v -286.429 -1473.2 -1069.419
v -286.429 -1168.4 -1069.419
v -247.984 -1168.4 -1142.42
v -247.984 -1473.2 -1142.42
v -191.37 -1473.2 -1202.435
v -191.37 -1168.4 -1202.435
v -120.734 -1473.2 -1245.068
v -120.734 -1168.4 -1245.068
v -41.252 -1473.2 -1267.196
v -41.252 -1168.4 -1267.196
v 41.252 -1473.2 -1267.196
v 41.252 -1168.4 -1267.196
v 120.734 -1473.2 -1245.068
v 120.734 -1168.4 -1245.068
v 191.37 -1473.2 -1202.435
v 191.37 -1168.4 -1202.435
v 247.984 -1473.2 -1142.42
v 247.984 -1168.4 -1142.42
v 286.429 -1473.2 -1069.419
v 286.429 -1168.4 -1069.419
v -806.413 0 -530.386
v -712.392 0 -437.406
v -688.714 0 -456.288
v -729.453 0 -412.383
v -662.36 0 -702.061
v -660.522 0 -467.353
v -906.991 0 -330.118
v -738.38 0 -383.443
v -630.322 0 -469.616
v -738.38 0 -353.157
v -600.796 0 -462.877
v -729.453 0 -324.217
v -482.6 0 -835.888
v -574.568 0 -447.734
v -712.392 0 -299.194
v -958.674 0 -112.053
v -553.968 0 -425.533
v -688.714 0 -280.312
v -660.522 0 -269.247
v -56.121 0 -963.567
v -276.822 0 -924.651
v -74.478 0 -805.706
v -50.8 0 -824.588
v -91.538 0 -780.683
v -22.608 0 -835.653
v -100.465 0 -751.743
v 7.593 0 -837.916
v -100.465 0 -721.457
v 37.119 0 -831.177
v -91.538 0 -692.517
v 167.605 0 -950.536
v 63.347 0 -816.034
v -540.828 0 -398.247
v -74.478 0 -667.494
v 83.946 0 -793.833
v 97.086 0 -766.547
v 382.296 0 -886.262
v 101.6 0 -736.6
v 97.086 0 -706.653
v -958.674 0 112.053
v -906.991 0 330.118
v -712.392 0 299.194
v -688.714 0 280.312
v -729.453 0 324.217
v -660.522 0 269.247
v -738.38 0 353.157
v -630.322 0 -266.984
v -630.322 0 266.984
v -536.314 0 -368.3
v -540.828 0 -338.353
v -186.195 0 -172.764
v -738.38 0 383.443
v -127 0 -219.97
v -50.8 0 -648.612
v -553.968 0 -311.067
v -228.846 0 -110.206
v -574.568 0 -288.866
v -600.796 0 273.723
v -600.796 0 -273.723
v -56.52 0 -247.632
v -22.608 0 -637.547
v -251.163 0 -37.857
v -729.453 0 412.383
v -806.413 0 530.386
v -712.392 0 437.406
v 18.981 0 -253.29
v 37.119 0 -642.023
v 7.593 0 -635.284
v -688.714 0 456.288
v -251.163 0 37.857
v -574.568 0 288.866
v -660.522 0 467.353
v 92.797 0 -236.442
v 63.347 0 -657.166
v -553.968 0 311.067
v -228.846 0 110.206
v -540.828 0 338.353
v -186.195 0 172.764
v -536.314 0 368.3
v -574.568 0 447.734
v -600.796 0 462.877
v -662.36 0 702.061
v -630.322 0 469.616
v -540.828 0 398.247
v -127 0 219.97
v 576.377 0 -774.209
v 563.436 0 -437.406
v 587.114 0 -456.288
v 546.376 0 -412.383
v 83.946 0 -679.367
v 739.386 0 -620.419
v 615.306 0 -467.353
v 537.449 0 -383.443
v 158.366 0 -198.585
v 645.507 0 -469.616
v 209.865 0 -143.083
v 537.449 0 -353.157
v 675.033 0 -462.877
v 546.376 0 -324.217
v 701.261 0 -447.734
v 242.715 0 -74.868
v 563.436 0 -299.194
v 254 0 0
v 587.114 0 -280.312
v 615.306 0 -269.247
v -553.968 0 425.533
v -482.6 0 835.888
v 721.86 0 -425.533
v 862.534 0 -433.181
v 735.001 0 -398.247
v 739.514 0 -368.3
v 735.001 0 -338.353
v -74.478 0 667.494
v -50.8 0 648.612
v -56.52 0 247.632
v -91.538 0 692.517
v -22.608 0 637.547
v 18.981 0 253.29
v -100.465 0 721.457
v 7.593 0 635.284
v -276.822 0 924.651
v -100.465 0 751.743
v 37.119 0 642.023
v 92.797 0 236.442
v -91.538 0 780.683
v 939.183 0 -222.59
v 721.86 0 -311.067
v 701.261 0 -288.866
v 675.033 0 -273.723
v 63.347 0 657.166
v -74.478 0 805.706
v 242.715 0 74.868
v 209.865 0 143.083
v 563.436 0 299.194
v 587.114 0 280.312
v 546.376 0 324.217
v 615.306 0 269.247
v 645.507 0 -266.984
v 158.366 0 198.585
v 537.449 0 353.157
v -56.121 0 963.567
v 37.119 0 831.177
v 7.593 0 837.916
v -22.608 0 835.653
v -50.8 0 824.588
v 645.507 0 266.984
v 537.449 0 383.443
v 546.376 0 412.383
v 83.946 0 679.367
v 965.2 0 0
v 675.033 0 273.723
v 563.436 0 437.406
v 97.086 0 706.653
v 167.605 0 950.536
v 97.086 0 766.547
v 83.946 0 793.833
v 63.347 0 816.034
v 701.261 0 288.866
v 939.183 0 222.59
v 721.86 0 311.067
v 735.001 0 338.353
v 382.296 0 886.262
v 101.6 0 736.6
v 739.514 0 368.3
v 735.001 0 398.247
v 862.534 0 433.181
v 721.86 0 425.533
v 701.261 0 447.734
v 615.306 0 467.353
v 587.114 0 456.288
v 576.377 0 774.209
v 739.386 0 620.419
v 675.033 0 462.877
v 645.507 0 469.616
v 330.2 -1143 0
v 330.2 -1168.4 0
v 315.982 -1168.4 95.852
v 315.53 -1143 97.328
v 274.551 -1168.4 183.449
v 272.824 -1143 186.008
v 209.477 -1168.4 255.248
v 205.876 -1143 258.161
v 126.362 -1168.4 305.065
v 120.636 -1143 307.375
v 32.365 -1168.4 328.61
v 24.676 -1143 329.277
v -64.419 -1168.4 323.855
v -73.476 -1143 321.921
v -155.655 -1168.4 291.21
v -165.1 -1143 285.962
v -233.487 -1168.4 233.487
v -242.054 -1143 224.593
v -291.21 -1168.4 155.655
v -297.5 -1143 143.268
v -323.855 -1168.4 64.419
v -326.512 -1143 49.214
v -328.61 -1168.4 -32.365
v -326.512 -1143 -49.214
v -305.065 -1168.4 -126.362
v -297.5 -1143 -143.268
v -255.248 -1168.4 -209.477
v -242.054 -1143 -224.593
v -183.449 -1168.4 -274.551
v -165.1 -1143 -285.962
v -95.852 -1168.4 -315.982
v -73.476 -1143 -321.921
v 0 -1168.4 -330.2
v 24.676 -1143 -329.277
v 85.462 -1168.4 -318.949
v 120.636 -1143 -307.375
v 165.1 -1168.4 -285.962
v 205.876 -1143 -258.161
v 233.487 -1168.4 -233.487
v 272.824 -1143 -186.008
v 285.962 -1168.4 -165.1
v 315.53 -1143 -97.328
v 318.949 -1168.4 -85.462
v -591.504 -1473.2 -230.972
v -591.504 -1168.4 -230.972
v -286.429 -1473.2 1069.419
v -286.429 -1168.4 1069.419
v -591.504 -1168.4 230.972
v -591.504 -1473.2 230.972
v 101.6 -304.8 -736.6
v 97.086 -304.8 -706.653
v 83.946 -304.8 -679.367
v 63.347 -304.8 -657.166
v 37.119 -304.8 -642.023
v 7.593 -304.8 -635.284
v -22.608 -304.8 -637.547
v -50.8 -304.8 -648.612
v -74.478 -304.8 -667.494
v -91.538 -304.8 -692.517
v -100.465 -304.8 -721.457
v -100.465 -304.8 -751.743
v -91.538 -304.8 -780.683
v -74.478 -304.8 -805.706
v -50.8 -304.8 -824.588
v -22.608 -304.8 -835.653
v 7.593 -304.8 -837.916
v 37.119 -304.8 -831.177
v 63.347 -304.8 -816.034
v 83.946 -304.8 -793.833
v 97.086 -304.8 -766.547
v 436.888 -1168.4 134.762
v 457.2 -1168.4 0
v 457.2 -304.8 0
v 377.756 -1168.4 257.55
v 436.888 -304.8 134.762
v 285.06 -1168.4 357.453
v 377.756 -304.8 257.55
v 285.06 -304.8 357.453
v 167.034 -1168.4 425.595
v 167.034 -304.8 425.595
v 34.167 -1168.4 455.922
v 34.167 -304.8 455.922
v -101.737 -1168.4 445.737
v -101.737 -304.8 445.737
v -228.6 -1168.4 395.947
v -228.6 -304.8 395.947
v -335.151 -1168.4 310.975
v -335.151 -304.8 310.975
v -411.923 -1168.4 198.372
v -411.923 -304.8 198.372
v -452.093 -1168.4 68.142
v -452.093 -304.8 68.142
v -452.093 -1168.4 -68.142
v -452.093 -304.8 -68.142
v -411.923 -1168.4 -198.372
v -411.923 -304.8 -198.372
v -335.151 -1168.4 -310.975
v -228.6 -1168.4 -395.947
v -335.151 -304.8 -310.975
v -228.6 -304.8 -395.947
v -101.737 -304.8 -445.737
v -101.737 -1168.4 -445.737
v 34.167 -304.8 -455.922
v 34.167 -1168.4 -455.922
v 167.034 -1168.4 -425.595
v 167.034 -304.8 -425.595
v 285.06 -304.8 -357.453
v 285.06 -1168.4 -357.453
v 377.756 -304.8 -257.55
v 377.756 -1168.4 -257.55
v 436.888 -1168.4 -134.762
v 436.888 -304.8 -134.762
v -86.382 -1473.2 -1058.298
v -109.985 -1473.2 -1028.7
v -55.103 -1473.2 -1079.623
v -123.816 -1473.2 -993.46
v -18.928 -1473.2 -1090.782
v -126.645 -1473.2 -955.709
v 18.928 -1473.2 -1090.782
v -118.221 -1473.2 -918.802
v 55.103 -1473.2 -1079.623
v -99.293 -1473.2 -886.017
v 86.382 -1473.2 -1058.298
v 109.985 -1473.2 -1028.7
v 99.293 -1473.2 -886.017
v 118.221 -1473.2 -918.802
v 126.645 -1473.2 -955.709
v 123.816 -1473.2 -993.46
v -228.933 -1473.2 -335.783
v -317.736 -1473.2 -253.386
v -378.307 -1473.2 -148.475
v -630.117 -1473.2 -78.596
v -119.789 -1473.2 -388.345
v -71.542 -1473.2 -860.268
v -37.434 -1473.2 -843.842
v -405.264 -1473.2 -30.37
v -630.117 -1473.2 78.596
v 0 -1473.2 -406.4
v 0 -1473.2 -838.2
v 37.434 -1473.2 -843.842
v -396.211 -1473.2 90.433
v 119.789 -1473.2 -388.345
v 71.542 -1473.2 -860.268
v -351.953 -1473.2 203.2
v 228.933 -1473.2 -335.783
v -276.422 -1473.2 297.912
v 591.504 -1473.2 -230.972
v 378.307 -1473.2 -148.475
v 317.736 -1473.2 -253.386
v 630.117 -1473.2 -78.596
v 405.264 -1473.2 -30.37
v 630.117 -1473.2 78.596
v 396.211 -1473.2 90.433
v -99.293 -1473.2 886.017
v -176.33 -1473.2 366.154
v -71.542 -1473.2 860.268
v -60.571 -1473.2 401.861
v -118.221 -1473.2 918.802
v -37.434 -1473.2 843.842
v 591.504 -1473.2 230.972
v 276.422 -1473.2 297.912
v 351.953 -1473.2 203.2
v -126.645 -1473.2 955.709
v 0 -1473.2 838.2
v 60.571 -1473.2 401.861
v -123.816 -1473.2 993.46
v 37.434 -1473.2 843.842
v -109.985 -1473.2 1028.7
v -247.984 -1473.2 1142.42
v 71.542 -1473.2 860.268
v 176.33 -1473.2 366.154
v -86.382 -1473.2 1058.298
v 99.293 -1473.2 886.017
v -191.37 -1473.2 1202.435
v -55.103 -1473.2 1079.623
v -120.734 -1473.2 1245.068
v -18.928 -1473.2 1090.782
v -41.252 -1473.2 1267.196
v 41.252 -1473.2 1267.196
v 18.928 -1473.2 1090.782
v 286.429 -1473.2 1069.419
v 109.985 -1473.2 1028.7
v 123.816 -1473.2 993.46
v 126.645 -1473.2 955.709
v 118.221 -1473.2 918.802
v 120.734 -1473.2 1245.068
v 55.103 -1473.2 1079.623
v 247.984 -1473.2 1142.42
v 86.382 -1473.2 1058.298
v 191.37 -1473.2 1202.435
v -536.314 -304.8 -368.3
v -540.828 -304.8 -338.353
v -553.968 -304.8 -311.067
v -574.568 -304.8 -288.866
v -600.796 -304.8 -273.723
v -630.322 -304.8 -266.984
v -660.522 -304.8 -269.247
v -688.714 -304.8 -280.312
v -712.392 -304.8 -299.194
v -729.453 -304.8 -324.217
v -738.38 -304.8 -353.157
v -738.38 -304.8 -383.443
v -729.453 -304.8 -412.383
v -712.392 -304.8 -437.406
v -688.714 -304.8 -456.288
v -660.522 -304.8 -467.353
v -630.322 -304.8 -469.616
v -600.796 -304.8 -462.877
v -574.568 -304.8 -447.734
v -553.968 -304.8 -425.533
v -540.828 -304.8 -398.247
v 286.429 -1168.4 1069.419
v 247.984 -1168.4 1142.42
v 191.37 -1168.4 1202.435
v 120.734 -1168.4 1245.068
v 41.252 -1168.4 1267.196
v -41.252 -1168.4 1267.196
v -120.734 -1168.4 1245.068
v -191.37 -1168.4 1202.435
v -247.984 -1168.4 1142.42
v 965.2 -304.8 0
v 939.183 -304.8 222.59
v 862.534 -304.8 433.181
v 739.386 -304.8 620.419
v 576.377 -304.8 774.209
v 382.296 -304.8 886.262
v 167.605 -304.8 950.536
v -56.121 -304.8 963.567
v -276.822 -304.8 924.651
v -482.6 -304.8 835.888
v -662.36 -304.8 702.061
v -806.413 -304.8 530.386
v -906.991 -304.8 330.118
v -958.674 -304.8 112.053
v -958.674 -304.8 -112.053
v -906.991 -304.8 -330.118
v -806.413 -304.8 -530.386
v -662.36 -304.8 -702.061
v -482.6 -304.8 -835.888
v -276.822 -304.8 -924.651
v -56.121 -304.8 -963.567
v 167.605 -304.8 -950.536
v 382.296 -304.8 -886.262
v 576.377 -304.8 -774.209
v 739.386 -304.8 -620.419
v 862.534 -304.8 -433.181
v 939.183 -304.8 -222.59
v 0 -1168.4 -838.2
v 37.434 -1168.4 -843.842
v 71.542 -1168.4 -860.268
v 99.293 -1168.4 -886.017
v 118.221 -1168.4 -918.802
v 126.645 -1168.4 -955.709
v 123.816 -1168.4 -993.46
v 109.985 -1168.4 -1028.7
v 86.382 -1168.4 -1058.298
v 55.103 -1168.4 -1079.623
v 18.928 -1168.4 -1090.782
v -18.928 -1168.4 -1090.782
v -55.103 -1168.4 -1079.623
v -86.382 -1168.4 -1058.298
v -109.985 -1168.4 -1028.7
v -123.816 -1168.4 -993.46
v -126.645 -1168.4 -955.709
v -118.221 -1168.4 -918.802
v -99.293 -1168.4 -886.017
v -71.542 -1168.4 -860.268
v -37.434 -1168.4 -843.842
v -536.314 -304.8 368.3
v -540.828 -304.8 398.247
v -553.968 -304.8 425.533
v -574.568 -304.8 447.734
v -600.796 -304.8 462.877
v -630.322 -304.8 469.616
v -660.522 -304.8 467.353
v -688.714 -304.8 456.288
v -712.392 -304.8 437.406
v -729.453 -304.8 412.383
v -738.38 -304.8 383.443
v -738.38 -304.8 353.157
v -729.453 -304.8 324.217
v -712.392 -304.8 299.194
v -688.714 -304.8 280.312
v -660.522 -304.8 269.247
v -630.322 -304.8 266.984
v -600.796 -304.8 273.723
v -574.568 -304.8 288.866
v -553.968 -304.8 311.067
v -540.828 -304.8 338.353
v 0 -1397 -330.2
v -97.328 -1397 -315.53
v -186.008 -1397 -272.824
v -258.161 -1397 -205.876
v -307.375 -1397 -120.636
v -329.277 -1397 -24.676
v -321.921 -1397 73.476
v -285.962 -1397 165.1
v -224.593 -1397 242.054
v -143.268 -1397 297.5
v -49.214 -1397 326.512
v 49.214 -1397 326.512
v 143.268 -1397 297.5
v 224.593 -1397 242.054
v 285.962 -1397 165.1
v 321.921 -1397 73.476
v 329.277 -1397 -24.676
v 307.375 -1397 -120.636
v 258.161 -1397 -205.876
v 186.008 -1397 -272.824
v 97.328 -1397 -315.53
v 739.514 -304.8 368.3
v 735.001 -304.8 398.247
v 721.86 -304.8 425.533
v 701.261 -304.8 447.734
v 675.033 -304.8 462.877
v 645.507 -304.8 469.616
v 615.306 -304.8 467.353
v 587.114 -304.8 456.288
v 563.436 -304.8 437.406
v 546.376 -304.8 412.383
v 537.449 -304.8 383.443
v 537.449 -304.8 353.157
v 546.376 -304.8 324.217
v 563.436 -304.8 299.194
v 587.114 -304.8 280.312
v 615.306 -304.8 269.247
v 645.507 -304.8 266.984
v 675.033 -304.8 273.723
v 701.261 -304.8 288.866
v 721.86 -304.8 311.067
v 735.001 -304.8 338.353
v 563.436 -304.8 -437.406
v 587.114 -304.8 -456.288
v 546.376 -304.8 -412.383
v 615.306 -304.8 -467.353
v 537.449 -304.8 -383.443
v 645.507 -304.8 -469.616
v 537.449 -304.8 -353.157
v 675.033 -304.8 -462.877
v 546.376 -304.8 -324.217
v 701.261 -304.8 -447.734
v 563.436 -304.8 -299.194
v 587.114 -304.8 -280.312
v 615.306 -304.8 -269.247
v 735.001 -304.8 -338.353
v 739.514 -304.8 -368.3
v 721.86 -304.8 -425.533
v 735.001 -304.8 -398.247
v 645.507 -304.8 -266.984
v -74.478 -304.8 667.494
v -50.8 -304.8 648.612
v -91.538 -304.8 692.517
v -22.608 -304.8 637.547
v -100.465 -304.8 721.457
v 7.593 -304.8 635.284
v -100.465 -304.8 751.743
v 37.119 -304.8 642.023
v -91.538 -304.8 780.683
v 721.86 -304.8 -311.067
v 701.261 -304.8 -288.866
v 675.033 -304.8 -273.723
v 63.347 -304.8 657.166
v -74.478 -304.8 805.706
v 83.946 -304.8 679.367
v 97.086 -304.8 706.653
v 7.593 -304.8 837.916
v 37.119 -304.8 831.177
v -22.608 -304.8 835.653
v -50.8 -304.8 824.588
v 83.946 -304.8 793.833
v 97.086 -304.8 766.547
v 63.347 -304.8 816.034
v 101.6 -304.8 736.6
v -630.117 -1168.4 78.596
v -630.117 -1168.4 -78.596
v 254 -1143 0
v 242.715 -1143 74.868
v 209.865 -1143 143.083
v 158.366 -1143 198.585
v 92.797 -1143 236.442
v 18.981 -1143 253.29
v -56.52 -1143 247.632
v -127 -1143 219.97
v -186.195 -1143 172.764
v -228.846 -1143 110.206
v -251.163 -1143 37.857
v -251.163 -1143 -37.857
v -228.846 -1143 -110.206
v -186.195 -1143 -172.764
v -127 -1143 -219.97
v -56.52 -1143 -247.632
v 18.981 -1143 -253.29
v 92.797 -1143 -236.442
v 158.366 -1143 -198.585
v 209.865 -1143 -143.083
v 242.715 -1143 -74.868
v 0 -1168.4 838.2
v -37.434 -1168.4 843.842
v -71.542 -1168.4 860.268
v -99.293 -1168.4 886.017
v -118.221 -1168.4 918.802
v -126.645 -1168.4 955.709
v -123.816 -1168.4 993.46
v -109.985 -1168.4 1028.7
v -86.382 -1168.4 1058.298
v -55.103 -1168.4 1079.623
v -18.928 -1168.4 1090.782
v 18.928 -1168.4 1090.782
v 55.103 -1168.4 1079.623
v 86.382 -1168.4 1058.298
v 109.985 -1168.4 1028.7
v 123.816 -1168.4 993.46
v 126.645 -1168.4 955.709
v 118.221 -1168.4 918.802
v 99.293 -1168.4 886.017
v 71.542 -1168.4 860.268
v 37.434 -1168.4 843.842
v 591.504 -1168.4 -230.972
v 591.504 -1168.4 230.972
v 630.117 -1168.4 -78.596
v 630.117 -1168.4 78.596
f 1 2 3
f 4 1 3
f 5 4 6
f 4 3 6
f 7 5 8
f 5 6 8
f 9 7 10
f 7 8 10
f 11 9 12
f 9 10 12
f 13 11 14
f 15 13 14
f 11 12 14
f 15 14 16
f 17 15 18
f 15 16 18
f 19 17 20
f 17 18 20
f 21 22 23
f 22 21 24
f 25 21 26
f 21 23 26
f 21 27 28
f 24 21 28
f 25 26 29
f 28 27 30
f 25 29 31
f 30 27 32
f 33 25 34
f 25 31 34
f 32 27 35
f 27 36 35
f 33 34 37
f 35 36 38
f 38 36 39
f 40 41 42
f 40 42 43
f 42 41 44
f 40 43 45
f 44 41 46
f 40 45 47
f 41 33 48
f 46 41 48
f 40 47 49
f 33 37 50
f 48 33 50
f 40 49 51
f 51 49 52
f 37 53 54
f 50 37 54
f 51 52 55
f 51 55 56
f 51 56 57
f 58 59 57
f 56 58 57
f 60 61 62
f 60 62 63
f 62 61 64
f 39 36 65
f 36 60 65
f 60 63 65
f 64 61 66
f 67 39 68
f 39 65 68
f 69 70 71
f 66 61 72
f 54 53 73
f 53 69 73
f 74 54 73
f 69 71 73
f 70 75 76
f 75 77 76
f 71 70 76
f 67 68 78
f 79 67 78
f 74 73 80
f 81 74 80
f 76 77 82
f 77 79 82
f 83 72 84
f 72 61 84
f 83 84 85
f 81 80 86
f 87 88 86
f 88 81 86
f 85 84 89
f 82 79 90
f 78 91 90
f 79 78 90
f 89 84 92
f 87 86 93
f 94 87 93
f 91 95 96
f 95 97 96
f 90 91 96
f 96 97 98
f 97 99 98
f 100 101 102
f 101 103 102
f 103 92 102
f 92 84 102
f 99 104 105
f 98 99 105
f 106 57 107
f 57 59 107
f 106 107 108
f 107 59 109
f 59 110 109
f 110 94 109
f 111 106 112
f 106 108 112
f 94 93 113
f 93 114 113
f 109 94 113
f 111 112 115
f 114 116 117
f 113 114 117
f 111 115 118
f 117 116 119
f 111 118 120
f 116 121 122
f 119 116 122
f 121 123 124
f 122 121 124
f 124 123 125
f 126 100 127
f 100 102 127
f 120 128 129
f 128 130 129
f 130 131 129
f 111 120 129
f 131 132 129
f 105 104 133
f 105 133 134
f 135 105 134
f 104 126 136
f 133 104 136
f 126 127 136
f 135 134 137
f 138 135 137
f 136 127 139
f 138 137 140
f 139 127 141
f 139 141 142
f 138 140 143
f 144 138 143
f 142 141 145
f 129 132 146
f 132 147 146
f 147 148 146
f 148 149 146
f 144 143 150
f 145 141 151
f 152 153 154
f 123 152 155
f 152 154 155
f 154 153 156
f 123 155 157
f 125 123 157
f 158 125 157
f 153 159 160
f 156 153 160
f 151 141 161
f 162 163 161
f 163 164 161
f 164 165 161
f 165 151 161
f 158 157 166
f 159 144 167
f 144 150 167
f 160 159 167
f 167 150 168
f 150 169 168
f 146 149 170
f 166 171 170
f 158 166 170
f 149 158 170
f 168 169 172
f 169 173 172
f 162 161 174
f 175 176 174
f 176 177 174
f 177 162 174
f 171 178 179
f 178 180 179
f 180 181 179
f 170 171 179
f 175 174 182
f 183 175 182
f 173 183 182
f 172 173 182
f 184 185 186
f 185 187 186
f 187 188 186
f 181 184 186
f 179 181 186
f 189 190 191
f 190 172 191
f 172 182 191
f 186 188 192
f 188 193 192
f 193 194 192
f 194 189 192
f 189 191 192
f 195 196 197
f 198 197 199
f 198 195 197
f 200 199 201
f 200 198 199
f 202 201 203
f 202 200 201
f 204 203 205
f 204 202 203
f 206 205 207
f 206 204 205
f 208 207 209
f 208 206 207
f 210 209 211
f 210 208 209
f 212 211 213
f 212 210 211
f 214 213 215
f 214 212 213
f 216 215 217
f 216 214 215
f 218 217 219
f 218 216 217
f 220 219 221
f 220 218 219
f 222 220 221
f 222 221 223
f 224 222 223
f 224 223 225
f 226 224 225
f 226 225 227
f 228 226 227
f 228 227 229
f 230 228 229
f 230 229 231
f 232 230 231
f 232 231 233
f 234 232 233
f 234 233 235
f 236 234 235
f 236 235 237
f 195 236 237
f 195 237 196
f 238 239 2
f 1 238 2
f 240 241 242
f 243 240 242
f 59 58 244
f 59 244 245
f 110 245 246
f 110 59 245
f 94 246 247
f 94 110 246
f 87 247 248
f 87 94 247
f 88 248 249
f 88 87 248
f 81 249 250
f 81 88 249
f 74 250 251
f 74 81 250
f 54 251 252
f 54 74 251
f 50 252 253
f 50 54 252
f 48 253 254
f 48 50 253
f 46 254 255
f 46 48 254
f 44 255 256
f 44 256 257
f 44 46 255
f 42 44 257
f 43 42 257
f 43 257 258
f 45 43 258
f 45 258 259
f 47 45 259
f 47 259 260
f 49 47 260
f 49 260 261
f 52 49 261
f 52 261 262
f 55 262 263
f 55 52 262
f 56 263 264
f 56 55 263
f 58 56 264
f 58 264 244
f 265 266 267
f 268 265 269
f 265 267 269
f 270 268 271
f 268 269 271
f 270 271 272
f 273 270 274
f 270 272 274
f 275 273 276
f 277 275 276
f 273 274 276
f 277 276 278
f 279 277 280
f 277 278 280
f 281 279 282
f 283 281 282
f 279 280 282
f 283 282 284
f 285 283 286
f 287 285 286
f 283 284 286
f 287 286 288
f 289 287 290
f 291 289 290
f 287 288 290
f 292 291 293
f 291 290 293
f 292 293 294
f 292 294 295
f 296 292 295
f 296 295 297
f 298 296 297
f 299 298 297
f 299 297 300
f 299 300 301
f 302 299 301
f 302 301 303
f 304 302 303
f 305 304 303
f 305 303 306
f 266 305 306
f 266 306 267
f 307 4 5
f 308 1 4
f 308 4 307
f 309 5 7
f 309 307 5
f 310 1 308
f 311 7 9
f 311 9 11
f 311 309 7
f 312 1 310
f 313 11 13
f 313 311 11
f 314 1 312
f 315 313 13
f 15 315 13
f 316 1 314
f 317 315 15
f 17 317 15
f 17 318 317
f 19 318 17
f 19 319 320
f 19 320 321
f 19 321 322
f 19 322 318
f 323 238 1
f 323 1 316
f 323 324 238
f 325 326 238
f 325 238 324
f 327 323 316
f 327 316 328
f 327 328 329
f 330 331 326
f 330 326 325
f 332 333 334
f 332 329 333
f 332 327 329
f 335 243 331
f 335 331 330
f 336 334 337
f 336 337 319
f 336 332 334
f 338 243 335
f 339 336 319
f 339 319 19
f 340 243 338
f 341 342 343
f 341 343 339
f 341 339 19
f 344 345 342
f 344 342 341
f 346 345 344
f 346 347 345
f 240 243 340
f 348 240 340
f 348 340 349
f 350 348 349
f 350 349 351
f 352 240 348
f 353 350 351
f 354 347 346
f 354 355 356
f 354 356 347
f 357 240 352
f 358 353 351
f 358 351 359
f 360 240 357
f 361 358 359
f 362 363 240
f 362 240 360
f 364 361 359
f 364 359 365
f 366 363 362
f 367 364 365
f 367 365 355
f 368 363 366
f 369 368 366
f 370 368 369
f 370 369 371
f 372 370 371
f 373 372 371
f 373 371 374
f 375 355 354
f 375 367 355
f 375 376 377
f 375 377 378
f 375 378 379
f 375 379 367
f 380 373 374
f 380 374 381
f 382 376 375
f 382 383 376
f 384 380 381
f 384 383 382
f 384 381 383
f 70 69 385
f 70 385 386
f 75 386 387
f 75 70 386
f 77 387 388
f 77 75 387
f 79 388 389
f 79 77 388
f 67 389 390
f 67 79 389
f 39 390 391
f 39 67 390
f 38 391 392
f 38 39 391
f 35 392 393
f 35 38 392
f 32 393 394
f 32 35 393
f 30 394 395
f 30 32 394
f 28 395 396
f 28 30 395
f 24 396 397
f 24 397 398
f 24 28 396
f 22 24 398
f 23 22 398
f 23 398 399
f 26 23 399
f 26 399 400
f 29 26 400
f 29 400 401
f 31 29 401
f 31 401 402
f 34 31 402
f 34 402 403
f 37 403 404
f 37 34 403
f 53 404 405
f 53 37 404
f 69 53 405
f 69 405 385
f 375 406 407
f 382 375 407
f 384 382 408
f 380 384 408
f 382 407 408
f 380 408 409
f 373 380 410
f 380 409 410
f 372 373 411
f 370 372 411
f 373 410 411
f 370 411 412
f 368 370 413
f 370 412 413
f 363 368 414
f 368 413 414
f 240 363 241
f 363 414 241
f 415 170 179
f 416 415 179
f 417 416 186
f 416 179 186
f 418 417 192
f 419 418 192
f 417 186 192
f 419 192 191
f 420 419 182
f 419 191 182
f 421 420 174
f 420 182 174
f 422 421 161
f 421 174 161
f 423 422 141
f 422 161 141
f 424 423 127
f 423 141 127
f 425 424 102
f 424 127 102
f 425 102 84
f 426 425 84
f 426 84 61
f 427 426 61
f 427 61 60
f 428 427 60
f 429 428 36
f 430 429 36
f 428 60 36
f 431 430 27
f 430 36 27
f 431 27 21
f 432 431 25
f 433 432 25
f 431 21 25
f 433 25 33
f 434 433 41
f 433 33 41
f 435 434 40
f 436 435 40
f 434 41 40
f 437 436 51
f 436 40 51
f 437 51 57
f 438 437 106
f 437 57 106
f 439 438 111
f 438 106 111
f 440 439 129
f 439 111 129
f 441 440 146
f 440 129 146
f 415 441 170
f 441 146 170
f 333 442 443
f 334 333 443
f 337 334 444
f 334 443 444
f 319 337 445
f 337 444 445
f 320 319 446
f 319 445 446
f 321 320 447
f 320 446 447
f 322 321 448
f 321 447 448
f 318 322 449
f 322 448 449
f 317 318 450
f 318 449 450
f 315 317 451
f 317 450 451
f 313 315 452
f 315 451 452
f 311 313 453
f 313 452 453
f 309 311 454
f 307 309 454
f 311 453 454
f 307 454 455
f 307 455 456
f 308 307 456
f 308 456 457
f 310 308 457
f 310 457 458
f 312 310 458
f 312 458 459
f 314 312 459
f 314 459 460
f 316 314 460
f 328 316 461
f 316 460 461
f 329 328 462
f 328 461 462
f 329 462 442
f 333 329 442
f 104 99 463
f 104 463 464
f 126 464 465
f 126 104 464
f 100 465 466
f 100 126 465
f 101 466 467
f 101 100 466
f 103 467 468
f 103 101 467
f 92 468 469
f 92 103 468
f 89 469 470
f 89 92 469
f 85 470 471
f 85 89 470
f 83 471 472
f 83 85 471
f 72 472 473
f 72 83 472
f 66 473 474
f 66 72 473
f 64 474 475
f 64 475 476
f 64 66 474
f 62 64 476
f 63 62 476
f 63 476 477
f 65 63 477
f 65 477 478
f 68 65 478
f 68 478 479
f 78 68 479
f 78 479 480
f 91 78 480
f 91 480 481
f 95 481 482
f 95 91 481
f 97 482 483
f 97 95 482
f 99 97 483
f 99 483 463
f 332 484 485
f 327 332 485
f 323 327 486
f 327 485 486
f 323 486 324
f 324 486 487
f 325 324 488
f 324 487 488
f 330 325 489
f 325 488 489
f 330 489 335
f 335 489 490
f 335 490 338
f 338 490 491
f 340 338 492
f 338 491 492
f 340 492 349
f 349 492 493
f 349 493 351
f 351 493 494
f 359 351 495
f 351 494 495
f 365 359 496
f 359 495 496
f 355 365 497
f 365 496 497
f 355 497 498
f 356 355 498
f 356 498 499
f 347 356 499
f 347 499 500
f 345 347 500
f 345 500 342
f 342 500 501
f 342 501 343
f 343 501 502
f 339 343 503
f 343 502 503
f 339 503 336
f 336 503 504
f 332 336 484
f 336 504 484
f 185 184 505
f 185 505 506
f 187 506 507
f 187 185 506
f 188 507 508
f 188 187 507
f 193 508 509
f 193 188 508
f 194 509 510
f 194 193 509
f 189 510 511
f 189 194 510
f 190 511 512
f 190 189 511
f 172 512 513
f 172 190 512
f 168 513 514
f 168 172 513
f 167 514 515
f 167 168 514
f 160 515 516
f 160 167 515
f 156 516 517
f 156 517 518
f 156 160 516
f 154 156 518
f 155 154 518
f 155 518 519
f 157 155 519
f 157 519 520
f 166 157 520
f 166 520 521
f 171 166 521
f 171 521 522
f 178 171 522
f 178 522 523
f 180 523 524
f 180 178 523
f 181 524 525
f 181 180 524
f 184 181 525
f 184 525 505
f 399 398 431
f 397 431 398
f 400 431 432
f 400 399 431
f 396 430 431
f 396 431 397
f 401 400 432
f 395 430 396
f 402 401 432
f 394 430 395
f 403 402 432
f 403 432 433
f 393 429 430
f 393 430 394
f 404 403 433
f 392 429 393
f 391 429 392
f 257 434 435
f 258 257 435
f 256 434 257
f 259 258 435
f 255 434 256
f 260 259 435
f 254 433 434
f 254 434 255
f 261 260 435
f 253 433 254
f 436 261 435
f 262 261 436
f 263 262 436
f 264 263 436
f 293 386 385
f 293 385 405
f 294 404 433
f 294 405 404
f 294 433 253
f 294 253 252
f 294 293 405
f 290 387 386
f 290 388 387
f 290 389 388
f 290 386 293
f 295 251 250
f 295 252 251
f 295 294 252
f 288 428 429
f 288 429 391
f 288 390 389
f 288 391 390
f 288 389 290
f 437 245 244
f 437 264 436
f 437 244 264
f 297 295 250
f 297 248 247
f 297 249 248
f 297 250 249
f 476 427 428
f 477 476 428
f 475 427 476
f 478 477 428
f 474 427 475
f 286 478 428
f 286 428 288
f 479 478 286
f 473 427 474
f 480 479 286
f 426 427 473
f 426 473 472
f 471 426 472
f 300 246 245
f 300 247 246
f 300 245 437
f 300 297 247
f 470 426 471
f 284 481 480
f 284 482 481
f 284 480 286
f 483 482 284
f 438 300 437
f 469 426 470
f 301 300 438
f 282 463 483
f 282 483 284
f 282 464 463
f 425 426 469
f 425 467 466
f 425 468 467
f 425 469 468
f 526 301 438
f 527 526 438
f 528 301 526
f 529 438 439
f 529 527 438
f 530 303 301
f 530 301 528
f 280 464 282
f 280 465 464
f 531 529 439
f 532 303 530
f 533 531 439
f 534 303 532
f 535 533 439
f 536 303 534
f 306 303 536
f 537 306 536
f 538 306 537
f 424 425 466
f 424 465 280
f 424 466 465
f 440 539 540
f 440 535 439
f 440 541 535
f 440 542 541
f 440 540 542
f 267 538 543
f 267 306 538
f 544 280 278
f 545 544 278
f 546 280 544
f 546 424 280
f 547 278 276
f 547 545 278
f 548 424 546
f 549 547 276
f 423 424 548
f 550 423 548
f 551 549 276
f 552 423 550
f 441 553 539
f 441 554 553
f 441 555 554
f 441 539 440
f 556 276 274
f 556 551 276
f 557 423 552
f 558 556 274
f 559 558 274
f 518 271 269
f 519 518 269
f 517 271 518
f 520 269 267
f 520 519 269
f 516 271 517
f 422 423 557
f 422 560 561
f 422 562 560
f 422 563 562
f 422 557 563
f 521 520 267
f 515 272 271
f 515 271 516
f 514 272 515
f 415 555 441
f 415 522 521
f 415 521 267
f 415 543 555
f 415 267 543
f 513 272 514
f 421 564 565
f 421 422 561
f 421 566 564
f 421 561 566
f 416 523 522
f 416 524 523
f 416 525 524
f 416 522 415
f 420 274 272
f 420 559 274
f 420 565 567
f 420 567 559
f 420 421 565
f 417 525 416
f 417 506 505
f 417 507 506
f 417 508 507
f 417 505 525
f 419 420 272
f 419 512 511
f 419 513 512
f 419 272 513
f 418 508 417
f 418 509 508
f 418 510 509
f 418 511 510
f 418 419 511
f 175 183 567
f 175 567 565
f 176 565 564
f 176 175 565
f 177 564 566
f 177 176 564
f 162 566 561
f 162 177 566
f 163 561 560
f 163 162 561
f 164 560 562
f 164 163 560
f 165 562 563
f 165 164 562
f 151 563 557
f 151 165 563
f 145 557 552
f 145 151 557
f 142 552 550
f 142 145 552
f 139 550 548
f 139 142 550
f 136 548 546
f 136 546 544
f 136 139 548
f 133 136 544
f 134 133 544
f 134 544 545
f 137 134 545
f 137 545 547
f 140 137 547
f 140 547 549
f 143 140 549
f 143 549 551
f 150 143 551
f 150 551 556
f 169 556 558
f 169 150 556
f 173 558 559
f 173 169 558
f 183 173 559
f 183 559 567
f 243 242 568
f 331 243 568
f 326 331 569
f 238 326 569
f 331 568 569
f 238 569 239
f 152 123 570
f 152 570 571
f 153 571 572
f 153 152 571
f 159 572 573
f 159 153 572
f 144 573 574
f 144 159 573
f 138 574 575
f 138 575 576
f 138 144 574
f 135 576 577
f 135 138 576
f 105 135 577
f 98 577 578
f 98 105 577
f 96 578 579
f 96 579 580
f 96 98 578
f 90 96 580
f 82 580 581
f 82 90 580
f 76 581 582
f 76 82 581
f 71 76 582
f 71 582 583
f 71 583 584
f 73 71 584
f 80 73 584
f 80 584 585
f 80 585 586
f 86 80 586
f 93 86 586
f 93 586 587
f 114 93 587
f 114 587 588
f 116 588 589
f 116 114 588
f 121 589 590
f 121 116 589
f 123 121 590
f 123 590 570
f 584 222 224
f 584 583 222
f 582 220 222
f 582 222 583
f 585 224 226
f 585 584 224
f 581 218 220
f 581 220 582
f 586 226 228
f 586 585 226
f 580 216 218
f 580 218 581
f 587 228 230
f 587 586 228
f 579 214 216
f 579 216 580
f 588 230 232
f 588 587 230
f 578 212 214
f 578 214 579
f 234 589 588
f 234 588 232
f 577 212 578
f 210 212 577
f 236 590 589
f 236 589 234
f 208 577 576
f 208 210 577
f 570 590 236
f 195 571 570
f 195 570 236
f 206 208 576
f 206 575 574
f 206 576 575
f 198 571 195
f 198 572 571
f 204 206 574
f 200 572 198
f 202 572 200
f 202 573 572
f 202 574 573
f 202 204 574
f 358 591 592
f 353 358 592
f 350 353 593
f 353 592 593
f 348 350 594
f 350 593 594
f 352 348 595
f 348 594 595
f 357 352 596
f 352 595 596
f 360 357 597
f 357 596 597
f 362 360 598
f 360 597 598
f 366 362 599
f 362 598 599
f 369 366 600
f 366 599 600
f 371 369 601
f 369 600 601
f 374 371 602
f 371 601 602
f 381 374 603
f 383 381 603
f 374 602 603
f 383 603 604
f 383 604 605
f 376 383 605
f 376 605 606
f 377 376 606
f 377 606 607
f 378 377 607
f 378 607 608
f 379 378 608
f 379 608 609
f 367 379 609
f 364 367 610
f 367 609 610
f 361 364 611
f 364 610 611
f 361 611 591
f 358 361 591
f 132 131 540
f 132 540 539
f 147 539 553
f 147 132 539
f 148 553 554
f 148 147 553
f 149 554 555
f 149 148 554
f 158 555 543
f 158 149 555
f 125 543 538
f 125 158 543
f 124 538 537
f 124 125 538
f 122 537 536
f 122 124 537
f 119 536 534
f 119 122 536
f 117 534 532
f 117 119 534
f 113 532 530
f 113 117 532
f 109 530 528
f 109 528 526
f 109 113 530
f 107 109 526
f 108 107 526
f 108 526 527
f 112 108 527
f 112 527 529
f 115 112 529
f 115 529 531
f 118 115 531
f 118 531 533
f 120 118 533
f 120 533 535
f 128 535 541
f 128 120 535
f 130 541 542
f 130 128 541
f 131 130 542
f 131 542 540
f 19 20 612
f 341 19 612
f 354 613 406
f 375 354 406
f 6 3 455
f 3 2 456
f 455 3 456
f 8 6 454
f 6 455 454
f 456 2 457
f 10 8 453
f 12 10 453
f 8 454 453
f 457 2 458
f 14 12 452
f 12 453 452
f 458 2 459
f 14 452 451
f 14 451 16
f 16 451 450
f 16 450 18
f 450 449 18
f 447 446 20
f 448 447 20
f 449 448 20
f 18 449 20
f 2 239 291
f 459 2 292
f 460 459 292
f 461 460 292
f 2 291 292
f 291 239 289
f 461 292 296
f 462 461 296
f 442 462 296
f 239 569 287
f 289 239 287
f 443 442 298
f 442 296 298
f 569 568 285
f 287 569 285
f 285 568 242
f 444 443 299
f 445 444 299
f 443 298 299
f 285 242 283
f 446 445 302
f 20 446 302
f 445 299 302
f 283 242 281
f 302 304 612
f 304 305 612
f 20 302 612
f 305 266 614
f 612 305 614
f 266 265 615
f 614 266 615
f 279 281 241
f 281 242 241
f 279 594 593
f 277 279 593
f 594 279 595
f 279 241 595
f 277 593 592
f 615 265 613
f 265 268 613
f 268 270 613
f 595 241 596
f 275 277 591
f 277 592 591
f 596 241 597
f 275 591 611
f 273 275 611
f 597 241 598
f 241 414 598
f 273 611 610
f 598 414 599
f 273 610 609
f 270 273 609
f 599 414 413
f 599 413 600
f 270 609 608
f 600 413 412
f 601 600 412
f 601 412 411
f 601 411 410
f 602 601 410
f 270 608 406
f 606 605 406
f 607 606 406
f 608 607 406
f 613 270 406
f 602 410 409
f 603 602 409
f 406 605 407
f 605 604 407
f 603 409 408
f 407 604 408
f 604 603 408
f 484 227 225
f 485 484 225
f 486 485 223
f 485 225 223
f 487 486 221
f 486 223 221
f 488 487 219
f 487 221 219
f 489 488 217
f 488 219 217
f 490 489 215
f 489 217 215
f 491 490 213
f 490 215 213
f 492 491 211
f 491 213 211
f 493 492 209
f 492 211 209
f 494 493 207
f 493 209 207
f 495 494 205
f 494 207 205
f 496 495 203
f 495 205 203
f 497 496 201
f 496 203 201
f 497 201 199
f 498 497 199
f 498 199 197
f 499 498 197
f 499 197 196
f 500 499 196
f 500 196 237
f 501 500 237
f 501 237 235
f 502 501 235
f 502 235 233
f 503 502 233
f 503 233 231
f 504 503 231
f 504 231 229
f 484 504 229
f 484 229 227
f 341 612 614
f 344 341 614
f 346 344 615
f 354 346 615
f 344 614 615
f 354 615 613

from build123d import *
from build123d import SkipClean  # not in build123d's __all__

# Parameters (mm, degrees)
F0_R     = 965.2
F0_R_2   = 101.6
F0_R_3   = 457.2
F1_DEPTH = 304.8
F0_R_4   = 330.2
F2_DEPTH = 1168.4
F0_R_5   = 254
F3_DEPTH = 1143
F5_DEPTH = 304.8
F6_SIZE2 = 76.2
F6_SIZE  = 76.2


# Not quite as in the source:
# - a feature names something its author has since deleted; it is built from what else it names


with BuildPart() as f1:
    # F0 (on Front) → F1 (new body)
    with BuildSketch(Plane.XZ):
        Circle(F0_R)
        with Locations((-637.9143124276, -368.3)):
            Circle(F0_R_2, mode=Mode.SUBTRACT)
        with Locations((0, -736.6)):
            Circle(F0_R_2, mode=Mode.SUBTRACT)
        with Locations((637.9143124276, -368.3)):
            Circle(F0_R_2, mode=Mode.SUBTRACT)
        with Locations((-637.9143124276, 368.3)):
            Circle(F0_R_2, mode=Mode.SUBTRACT)
        Circle(F0_R_3, mode=Mode.SUBTRACT)
        with Locations((637.9143124276, 368.3)):
            Circle(F0_R_2, mode=Mode.SUBTRACT)
        with Locations((0, 736.6)):
            Circle(F0_R_2, mode=Mode.SUBTRACT)
    extrude(amount=F1_DEPTH)

    # F0 (on Front) → F2 (join)
    with BuildSketch(Plane.XZ):
        Circle(F0_R_3)
        Circle(F0_R_4, mode=Mode.SUBTRACT)
    extrude(amount=F2_DEPTH)

    # F0 (on Front) → F3 (join)
    with BuildSketch(Plane.XZ):
        Circle(F0_R_4)
        Circle(F0_R_5, mode=Mode.SUBTRACT)
    extrude(amount=F3_DEPTH)

    # F4 (on face) → F5 (join)
    with BuildSketch(Plane.XZ.offset(1168.4)):
        with BuildLine():
            ThreePointArc((591.503767336, -230.9724945255), (624.031206054, -117.5161855696), (635, 0))
            ThreePointArc((635, 0), (624.031206054, 117.5161855696), (591.503767336, 230.9724945255))
            ThreePointArc((591.503767336, 230.9724945255), (358.1602057574, 524.3531891882), (0, 635))
            Line((0, 635), (0, 457.2))
            ThreePointArc((0, 457.2), (323.2892203585, 323.2892203585), (457.2, 0))
            ThreePointArc((457.2, 0), (323.2892203585, -323.2892203585), (0, -457.2))
            Line((0, -457.2), (0, -635))
            ThreePointArc((0, -635), (358.1602057574, -524.3531891882), (591.503767336, -230.9724945255))
        make_face()
        with BuildLine():
            ThreePointArc((0, 635), (358.1602057574, 524.3531891882), (591.503767336, 230.9724945255))
            Line((591.503767336, 230.9724945255), (286.428692972, 1069.4192105246))
            ThreePointArc((286.428692972, 1069.4192105246), (300.172038686, 1018.1130153278), (304.8, 965.2))
            ThreePointArc((304.8, 965.2), (215.5261469057, 749.6738530943), (0, 660.4))
            Line((0, 660.4), (0, 635))
        make_face()
        with BuildLine():
            Line((286.428692972, -1069.4192105246), (591.503767336, -230.9724945255))
            ThreePointArc((591.503767336, -230.9724945255), (358.1602057574, -524.3531891882), (0, -635))
            Line((0, -635), (0, -660.4))
            ThreePointArc((0, -660.4), (215.5261469057, -749.6738530943), (304.8, -965.2))
            ThreePointArc((304.8, -965.2), (300.172038686, -1018.1130153278), (286.428692972, -1069.4192105246))
        make_face()
        with BuildLine():
            Line((0, 457.2), (0, 635))
            ThreePointArc((0, 635), (-358.1602057574, 524.3531891882), (-591.503767336, 230.9724945255))
            ThreePointArc((-591.503767336, 230.9724945255), (-635, 0), (-591.503767336, -230.9724945255))
            ThreePointArc((-591.503767336, -230.9724945255), (-358.1602057574, -524.3531891882), (0, -635))
            Line((0, -635), (0, -457.2))
            ThreePointArc((0, -457.2), (-457.2, 0), (0, 457.2))
        make_face()
        with BuildLine():
            ThreePointArc((-591.503767336, 230.9724945255), (-358.1602057574, 524.3531891882), (0, 635))
            Line((0, 635), (0, 660.4))
            ThreePointArc((0, 660.4), (-249.6688360288, 790.3614678738), (-286.428692972, 1069.4192105246))
            Line((-286.428692972, 1069.4192105246), (-591.503767336, 230.9724945255))
        make_face()
        with BuildLine():
            ThreePointArc((304.8, 965.2), (300.172038686, 1018.1130153278), (286.428692972, 1069.4192105246))
            ThreePointArc((286.428692972, 1069.4192105246), (0, 1270), (-286.428692972, 1069.4192105246))
            ThreePointArc((-286.428692972, 1069.4192105246), (-249.6688360288, 790.3614678738), (0, 660.4))
            ThreePointArc((0, 660.4), (215.5261469057, 749.6738530943), (304.8, 965.2))
        make_face()
        with BuildLine():
            ThreePointArc((127, 965.2), (89.8025612107, 875.3974387893), (0, 838.2))
            ThreePointArc((0, 838.2), (-89.8025612107, 1055.0025612107), (127, 965.2))
        make_face(mode=Mode.SUBTRACT)
        with BuildLine():
            Line((0, -660.4), (0, -635))
            ThreePointArc((0, -635), (-358.1602057574, -524.3531891882), (-591.503767336, -230.9724945255))
            Line((-591.503767336, -230.9724945255), (-286.428692972, -1069.4192105246))
            ThreePointArc((-286.428692972, -1069.4192105246), (-249.6688360288, -790.3614678738), (0, -660.4))
        make_face()
        with BuildLine():
            ThreePointArc((-286.428692972, -1069.4192105246), (0, -1270), (286.428692972, -1069.4192105246))
            ThreePointArc((286.428692972, -1069.4192105246), (300.172038686, -1018.1130153278), (304.8, -965.2))
            ThreePointArc((304.8, -965.2), (215.5261469057, -749.6738530943), (0, -660.4))
            ThreePointArc((0, -660.4), (-249.6688360288, -790.3614678738), (-286.428692972, -1069.4192105246))
        make_face()
        with BuildLine():
            ThreePointArc((127, -965.2), (-89.8025612107, -1055.0025612107), (0, -838.2))
            ThreePointArc((0, -838.2), (89.8025612107, -875.3974387893), (127, -965.2))
        make_face(mode=Mode.SUBTRACT)
        with BuildLine():
            ThreePointArc((457.2, 0), (323.2892203585, 323.2892203585), (0, 457.2))
            Line((0, 457.2), (0, 330.2))
            ThreePointArc((0, 330.2), (233.4866591478, 233.4866591478), (330.2, 0))
            ThreePointArc((330.2, 0), (233.4866591478, -233.4866591478), (0, -330.2))
            Line((0, -330.2), (0, -457.2))
            ThreePointArc((0, -457.2), (323.2892203585, -323.2892203585), (457.2, 0))
        make_face()
        with BuildLine():
            Line((0, 330.2), (0, 457.2))
            ThreePointArc((0, 457.2), (-457.2, 0), (0, -457.2))
            Line((0, -457.2), (0, -330.2))
            ThreePointArc((0, -330.2), (-330.2, 0), (0, 330.2))
        make_face()
    with SkipClean():  # cleaning this boolean's faces spoils the solid; the shape is the same uncleaned
        extrude(amount=F5_DEPTH)

    # F6
    f6_edges = [f1.edges().sort_by_distance(p)[0] for p in [
        (0, -1473.2, 330.2),
    ]]
    chamfer(f6_edges, length=F6_SIZE, length2=F6_SIZE2)


solid = f1.part
